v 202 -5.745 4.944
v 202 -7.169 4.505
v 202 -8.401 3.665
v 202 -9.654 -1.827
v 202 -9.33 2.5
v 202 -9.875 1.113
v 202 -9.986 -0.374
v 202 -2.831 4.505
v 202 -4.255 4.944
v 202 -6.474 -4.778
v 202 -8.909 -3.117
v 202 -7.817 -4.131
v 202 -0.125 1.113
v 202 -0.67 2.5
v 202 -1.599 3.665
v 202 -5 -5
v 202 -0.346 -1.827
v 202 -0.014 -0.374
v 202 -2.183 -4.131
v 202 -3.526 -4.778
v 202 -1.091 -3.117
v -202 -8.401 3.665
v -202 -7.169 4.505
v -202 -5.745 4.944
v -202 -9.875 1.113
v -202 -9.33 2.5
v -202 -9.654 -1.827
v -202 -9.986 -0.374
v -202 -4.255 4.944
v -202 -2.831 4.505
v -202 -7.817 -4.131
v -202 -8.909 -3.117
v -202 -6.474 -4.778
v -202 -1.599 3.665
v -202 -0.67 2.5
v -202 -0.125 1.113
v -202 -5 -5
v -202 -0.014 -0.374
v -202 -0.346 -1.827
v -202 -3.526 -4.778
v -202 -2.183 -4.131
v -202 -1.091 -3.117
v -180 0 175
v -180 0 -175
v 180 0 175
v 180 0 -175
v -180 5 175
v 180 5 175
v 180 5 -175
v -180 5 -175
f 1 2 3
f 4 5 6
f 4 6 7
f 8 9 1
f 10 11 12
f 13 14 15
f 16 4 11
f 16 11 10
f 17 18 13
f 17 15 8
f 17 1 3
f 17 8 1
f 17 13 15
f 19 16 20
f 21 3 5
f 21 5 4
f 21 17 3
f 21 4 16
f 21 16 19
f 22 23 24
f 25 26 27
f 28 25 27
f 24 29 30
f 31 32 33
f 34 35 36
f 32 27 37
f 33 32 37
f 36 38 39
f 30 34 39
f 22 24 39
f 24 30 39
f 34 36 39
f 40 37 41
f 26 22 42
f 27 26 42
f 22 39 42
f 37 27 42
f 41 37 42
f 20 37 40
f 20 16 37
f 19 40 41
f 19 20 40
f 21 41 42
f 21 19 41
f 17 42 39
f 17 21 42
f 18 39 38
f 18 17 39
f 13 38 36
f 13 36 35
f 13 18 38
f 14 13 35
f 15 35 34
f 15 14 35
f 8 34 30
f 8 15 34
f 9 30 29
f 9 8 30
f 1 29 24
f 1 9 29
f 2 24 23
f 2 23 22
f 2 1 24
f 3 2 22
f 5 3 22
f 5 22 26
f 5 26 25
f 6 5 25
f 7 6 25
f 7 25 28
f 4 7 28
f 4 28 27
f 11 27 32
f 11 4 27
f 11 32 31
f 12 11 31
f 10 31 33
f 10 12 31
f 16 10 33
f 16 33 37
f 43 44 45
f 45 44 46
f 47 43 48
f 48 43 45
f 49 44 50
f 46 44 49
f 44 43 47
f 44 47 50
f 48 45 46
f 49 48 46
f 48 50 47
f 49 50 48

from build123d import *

# Parameters (mm, degrees)
ESQUISSE1_W        = 360
ESQUISSE1_H        = 350
BOSS_EXTRU_1_DEPTH = 5
ESQUISSE2_R        = 5
BOSS_EXTRU_2_DEPTH = 202


with BuildPart() as part:
    # Esquisse1 → Boss.-Extru.1 (new body)
    with BuildSketch(Plane(origin=(0, 0, 0), x_dir=(1, 0, 0), z_dir=(0, 1, 0))):
        Rectangle(ESQUISSE1_W, ESQUISSE1_H)
    extrude(amount=BOSS_EXTRU_1_DEPTH)


with BuildPart() as body_2:
    # Esquisse2 → Boss.-Extru.2 (new body, symmetric)
    with BuildSketch(Plane(origin=(0, 0, 0), x_dir=(0, 0, -1), z_dir=(1, 0, 0))):
        with Locations((0, -5)):
            Circle(ESQUISSE2_R)
    extrude(amount=BOSS_EXTRU_2_DEPTH, both=True)


solid = Compound([part.part, body_2.part])
